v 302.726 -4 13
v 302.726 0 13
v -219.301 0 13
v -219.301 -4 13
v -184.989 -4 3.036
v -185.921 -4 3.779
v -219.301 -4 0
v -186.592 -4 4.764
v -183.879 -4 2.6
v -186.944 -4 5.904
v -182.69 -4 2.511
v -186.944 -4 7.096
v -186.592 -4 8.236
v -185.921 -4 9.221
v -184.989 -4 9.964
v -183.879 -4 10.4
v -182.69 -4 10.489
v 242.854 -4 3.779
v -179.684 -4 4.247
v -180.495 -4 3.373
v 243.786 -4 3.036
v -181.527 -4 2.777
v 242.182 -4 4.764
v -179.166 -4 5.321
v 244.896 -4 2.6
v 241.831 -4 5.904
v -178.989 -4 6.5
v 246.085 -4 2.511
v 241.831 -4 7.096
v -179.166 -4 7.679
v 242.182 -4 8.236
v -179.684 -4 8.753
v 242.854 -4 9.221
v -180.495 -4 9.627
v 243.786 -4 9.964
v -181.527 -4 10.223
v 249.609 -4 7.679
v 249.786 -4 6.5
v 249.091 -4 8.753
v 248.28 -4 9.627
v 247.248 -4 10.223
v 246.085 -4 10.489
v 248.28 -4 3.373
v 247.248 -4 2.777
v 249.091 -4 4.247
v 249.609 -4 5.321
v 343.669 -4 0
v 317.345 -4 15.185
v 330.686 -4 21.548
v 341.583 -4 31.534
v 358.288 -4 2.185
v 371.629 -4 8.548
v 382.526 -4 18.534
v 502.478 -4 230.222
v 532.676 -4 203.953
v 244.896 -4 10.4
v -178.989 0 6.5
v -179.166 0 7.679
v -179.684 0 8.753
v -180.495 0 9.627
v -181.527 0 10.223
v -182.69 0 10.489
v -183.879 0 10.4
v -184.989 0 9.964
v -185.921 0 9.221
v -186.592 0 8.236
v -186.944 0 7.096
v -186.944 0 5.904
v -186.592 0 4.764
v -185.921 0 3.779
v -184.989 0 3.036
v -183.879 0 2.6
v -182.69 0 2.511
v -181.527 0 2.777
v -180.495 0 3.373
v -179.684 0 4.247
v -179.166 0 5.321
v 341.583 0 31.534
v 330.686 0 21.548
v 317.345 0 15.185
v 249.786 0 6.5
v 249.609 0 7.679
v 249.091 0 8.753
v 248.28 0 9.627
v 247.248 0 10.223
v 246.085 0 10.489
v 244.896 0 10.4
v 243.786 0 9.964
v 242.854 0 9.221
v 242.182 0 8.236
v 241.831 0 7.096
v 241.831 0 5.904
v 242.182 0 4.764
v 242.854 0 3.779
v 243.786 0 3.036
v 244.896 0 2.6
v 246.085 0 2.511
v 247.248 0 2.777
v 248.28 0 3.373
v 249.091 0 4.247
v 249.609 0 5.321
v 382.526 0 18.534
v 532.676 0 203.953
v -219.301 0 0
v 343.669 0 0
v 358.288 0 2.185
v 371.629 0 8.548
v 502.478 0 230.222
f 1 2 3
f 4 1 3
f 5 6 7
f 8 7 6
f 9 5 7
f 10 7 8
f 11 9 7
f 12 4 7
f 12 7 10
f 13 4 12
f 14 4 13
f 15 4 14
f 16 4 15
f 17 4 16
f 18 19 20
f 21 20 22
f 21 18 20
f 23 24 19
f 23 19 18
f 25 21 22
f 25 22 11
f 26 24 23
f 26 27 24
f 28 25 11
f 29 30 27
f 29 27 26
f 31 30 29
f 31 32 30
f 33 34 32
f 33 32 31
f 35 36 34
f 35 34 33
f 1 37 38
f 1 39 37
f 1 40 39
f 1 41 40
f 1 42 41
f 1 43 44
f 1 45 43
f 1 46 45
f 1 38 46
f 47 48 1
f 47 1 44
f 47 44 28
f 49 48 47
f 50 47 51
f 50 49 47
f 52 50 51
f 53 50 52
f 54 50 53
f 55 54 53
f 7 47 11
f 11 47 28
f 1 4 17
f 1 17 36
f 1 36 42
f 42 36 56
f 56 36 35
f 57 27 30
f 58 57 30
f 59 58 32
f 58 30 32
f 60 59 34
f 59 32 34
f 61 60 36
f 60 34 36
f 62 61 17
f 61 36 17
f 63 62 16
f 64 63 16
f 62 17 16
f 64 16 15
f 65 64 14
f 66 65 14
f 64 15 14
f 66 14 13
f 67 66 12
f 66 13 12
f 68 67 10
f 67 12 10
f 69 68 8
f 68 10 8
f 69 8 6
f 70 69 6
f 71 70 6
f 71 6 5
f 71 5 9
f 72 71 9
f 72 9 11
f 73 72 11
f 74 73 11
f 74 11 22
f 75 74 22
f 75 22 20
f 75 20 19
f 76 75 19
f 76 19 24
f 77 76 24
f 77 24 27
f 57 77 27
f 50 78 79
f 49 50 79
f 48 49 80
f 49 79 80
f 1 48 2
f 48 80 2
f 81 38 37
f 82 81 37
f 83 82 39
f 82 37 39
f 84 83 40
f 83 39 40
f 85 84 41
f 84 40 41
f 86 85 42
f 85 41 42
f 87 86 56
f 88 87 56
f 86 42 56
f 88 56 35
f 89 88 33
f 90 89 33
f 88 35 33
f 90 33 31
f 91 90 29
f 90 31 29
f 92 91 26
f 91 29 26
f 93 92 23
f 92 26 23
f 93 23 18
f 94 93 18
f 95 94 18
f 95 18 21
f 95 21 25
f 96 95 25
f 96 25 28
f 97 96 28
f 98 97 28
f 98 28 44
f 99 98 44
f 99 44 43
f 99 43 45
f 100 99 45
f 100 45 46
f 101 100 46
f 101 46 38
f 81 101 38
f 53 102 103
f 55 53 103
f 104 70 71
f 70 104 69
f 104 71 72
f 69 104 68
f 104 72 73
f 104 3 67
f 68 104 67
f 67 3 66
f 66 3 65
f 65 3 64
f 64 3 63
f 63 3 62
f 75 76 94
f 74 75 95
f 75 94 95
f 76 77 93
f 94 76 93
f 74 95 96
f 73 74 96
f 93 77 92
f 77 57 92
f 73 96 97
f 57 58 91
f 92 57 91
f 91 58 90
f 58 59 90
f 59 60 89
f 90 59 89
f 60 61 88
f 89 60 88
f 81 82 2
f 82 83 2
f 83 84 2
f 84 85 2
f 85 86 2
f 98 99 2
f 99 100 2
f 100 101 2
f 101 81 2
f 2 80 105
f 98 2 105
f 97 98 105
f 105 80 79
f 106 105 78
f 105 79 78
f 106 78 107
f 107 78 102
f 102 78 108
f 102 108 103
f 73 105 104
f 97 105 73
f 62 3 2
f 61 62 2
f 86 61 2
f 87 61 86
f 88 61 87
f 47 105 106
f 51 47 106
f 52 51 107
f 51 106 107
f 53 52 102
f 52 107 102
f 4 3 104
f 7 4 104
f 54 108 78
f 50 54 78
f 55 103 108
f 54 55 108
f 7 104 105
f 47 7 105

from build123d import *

# Parameters (mm, degrees)
F1_DEPTH = 4
F2_R     = 4
F3_DEPTH = 25


with BuildPart() as f1:
    # F0 (on Front) → F1 (new body)
    with BuildSketch(Plane.XZ):
        with BuildLine():
            Line((-219.300896, 13), (-219.300896, 0))
            Line((-219.300896, 0), (343.669184, 0))
            ThreePointArc((343.669184, 0), (365.194739, 4.870736), (382.526482, 18.53398))
            Line((382.526482, 18.53398), (532.675548, 203.952635))
            Line((532.675548, 203.952635), (502.477538, 230.221827))
            Line((502.477538, 230.221827), (341.583292, 31.53398))
            ThreePointArc((341.583292, 31.53398), (324.251549, 17.870736), (302.725994, 13))
            Line((302.725994, 13), (-219.300896, 13))
        make_face()
    extrude(amount=F1_DEPTH)

    # F2 (on face) → F3 (cut)
    with BuildSketch(Plane.XZ.offset(4)):
        with Locations((245.786324, 6.5)):
            Circle(F2_R)
        with Locations((-182.988614, 6.5)):
            Circle(F2_R)
    extrude(amount=-F3_DEPTH, mode=Mode.SUBTRACT)


solid = f1.part
